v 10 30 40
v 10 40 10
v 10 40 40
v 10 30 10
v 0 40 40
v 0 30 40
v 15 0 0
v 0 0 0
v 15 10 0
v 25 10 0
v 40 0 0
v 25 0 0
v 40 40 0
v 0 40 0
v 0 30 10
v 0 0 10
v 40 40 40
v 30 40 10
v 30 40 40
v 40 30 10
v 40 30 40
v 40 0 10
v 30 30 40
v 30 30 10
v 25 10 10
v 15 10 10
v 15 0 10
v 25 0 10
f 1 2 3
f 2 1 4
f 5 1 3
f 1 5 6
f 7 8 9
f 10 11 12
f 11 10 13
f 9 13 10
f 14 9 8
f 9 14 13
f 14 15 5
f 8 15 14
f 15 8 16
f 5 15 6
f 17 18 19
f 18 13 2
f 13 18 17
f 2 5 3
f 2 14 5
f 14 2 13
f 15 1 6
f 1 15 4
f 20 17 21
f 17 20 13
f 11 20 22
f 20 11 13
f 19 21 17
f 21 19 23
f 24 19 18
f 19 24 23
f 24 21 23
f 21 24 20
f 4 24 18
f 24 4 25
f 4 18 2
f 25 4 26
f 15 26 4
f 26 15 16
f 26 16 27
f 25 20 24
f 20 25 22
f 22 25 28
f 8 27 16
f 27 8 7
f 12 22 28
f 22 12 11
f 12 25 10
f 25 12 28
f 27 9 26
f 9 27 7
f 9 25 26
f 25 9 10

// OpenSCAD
difference(){
union(){
//lateral
translate([0,30,0])
cube([10,10,40]);
// pared fondo
translate([30,30,0])
cube([10,10,40]);
// base
cube([40,40,10]);
}
union(){
// hueco
translate([15,0,0])
cube([10,10,20]);
}
}
